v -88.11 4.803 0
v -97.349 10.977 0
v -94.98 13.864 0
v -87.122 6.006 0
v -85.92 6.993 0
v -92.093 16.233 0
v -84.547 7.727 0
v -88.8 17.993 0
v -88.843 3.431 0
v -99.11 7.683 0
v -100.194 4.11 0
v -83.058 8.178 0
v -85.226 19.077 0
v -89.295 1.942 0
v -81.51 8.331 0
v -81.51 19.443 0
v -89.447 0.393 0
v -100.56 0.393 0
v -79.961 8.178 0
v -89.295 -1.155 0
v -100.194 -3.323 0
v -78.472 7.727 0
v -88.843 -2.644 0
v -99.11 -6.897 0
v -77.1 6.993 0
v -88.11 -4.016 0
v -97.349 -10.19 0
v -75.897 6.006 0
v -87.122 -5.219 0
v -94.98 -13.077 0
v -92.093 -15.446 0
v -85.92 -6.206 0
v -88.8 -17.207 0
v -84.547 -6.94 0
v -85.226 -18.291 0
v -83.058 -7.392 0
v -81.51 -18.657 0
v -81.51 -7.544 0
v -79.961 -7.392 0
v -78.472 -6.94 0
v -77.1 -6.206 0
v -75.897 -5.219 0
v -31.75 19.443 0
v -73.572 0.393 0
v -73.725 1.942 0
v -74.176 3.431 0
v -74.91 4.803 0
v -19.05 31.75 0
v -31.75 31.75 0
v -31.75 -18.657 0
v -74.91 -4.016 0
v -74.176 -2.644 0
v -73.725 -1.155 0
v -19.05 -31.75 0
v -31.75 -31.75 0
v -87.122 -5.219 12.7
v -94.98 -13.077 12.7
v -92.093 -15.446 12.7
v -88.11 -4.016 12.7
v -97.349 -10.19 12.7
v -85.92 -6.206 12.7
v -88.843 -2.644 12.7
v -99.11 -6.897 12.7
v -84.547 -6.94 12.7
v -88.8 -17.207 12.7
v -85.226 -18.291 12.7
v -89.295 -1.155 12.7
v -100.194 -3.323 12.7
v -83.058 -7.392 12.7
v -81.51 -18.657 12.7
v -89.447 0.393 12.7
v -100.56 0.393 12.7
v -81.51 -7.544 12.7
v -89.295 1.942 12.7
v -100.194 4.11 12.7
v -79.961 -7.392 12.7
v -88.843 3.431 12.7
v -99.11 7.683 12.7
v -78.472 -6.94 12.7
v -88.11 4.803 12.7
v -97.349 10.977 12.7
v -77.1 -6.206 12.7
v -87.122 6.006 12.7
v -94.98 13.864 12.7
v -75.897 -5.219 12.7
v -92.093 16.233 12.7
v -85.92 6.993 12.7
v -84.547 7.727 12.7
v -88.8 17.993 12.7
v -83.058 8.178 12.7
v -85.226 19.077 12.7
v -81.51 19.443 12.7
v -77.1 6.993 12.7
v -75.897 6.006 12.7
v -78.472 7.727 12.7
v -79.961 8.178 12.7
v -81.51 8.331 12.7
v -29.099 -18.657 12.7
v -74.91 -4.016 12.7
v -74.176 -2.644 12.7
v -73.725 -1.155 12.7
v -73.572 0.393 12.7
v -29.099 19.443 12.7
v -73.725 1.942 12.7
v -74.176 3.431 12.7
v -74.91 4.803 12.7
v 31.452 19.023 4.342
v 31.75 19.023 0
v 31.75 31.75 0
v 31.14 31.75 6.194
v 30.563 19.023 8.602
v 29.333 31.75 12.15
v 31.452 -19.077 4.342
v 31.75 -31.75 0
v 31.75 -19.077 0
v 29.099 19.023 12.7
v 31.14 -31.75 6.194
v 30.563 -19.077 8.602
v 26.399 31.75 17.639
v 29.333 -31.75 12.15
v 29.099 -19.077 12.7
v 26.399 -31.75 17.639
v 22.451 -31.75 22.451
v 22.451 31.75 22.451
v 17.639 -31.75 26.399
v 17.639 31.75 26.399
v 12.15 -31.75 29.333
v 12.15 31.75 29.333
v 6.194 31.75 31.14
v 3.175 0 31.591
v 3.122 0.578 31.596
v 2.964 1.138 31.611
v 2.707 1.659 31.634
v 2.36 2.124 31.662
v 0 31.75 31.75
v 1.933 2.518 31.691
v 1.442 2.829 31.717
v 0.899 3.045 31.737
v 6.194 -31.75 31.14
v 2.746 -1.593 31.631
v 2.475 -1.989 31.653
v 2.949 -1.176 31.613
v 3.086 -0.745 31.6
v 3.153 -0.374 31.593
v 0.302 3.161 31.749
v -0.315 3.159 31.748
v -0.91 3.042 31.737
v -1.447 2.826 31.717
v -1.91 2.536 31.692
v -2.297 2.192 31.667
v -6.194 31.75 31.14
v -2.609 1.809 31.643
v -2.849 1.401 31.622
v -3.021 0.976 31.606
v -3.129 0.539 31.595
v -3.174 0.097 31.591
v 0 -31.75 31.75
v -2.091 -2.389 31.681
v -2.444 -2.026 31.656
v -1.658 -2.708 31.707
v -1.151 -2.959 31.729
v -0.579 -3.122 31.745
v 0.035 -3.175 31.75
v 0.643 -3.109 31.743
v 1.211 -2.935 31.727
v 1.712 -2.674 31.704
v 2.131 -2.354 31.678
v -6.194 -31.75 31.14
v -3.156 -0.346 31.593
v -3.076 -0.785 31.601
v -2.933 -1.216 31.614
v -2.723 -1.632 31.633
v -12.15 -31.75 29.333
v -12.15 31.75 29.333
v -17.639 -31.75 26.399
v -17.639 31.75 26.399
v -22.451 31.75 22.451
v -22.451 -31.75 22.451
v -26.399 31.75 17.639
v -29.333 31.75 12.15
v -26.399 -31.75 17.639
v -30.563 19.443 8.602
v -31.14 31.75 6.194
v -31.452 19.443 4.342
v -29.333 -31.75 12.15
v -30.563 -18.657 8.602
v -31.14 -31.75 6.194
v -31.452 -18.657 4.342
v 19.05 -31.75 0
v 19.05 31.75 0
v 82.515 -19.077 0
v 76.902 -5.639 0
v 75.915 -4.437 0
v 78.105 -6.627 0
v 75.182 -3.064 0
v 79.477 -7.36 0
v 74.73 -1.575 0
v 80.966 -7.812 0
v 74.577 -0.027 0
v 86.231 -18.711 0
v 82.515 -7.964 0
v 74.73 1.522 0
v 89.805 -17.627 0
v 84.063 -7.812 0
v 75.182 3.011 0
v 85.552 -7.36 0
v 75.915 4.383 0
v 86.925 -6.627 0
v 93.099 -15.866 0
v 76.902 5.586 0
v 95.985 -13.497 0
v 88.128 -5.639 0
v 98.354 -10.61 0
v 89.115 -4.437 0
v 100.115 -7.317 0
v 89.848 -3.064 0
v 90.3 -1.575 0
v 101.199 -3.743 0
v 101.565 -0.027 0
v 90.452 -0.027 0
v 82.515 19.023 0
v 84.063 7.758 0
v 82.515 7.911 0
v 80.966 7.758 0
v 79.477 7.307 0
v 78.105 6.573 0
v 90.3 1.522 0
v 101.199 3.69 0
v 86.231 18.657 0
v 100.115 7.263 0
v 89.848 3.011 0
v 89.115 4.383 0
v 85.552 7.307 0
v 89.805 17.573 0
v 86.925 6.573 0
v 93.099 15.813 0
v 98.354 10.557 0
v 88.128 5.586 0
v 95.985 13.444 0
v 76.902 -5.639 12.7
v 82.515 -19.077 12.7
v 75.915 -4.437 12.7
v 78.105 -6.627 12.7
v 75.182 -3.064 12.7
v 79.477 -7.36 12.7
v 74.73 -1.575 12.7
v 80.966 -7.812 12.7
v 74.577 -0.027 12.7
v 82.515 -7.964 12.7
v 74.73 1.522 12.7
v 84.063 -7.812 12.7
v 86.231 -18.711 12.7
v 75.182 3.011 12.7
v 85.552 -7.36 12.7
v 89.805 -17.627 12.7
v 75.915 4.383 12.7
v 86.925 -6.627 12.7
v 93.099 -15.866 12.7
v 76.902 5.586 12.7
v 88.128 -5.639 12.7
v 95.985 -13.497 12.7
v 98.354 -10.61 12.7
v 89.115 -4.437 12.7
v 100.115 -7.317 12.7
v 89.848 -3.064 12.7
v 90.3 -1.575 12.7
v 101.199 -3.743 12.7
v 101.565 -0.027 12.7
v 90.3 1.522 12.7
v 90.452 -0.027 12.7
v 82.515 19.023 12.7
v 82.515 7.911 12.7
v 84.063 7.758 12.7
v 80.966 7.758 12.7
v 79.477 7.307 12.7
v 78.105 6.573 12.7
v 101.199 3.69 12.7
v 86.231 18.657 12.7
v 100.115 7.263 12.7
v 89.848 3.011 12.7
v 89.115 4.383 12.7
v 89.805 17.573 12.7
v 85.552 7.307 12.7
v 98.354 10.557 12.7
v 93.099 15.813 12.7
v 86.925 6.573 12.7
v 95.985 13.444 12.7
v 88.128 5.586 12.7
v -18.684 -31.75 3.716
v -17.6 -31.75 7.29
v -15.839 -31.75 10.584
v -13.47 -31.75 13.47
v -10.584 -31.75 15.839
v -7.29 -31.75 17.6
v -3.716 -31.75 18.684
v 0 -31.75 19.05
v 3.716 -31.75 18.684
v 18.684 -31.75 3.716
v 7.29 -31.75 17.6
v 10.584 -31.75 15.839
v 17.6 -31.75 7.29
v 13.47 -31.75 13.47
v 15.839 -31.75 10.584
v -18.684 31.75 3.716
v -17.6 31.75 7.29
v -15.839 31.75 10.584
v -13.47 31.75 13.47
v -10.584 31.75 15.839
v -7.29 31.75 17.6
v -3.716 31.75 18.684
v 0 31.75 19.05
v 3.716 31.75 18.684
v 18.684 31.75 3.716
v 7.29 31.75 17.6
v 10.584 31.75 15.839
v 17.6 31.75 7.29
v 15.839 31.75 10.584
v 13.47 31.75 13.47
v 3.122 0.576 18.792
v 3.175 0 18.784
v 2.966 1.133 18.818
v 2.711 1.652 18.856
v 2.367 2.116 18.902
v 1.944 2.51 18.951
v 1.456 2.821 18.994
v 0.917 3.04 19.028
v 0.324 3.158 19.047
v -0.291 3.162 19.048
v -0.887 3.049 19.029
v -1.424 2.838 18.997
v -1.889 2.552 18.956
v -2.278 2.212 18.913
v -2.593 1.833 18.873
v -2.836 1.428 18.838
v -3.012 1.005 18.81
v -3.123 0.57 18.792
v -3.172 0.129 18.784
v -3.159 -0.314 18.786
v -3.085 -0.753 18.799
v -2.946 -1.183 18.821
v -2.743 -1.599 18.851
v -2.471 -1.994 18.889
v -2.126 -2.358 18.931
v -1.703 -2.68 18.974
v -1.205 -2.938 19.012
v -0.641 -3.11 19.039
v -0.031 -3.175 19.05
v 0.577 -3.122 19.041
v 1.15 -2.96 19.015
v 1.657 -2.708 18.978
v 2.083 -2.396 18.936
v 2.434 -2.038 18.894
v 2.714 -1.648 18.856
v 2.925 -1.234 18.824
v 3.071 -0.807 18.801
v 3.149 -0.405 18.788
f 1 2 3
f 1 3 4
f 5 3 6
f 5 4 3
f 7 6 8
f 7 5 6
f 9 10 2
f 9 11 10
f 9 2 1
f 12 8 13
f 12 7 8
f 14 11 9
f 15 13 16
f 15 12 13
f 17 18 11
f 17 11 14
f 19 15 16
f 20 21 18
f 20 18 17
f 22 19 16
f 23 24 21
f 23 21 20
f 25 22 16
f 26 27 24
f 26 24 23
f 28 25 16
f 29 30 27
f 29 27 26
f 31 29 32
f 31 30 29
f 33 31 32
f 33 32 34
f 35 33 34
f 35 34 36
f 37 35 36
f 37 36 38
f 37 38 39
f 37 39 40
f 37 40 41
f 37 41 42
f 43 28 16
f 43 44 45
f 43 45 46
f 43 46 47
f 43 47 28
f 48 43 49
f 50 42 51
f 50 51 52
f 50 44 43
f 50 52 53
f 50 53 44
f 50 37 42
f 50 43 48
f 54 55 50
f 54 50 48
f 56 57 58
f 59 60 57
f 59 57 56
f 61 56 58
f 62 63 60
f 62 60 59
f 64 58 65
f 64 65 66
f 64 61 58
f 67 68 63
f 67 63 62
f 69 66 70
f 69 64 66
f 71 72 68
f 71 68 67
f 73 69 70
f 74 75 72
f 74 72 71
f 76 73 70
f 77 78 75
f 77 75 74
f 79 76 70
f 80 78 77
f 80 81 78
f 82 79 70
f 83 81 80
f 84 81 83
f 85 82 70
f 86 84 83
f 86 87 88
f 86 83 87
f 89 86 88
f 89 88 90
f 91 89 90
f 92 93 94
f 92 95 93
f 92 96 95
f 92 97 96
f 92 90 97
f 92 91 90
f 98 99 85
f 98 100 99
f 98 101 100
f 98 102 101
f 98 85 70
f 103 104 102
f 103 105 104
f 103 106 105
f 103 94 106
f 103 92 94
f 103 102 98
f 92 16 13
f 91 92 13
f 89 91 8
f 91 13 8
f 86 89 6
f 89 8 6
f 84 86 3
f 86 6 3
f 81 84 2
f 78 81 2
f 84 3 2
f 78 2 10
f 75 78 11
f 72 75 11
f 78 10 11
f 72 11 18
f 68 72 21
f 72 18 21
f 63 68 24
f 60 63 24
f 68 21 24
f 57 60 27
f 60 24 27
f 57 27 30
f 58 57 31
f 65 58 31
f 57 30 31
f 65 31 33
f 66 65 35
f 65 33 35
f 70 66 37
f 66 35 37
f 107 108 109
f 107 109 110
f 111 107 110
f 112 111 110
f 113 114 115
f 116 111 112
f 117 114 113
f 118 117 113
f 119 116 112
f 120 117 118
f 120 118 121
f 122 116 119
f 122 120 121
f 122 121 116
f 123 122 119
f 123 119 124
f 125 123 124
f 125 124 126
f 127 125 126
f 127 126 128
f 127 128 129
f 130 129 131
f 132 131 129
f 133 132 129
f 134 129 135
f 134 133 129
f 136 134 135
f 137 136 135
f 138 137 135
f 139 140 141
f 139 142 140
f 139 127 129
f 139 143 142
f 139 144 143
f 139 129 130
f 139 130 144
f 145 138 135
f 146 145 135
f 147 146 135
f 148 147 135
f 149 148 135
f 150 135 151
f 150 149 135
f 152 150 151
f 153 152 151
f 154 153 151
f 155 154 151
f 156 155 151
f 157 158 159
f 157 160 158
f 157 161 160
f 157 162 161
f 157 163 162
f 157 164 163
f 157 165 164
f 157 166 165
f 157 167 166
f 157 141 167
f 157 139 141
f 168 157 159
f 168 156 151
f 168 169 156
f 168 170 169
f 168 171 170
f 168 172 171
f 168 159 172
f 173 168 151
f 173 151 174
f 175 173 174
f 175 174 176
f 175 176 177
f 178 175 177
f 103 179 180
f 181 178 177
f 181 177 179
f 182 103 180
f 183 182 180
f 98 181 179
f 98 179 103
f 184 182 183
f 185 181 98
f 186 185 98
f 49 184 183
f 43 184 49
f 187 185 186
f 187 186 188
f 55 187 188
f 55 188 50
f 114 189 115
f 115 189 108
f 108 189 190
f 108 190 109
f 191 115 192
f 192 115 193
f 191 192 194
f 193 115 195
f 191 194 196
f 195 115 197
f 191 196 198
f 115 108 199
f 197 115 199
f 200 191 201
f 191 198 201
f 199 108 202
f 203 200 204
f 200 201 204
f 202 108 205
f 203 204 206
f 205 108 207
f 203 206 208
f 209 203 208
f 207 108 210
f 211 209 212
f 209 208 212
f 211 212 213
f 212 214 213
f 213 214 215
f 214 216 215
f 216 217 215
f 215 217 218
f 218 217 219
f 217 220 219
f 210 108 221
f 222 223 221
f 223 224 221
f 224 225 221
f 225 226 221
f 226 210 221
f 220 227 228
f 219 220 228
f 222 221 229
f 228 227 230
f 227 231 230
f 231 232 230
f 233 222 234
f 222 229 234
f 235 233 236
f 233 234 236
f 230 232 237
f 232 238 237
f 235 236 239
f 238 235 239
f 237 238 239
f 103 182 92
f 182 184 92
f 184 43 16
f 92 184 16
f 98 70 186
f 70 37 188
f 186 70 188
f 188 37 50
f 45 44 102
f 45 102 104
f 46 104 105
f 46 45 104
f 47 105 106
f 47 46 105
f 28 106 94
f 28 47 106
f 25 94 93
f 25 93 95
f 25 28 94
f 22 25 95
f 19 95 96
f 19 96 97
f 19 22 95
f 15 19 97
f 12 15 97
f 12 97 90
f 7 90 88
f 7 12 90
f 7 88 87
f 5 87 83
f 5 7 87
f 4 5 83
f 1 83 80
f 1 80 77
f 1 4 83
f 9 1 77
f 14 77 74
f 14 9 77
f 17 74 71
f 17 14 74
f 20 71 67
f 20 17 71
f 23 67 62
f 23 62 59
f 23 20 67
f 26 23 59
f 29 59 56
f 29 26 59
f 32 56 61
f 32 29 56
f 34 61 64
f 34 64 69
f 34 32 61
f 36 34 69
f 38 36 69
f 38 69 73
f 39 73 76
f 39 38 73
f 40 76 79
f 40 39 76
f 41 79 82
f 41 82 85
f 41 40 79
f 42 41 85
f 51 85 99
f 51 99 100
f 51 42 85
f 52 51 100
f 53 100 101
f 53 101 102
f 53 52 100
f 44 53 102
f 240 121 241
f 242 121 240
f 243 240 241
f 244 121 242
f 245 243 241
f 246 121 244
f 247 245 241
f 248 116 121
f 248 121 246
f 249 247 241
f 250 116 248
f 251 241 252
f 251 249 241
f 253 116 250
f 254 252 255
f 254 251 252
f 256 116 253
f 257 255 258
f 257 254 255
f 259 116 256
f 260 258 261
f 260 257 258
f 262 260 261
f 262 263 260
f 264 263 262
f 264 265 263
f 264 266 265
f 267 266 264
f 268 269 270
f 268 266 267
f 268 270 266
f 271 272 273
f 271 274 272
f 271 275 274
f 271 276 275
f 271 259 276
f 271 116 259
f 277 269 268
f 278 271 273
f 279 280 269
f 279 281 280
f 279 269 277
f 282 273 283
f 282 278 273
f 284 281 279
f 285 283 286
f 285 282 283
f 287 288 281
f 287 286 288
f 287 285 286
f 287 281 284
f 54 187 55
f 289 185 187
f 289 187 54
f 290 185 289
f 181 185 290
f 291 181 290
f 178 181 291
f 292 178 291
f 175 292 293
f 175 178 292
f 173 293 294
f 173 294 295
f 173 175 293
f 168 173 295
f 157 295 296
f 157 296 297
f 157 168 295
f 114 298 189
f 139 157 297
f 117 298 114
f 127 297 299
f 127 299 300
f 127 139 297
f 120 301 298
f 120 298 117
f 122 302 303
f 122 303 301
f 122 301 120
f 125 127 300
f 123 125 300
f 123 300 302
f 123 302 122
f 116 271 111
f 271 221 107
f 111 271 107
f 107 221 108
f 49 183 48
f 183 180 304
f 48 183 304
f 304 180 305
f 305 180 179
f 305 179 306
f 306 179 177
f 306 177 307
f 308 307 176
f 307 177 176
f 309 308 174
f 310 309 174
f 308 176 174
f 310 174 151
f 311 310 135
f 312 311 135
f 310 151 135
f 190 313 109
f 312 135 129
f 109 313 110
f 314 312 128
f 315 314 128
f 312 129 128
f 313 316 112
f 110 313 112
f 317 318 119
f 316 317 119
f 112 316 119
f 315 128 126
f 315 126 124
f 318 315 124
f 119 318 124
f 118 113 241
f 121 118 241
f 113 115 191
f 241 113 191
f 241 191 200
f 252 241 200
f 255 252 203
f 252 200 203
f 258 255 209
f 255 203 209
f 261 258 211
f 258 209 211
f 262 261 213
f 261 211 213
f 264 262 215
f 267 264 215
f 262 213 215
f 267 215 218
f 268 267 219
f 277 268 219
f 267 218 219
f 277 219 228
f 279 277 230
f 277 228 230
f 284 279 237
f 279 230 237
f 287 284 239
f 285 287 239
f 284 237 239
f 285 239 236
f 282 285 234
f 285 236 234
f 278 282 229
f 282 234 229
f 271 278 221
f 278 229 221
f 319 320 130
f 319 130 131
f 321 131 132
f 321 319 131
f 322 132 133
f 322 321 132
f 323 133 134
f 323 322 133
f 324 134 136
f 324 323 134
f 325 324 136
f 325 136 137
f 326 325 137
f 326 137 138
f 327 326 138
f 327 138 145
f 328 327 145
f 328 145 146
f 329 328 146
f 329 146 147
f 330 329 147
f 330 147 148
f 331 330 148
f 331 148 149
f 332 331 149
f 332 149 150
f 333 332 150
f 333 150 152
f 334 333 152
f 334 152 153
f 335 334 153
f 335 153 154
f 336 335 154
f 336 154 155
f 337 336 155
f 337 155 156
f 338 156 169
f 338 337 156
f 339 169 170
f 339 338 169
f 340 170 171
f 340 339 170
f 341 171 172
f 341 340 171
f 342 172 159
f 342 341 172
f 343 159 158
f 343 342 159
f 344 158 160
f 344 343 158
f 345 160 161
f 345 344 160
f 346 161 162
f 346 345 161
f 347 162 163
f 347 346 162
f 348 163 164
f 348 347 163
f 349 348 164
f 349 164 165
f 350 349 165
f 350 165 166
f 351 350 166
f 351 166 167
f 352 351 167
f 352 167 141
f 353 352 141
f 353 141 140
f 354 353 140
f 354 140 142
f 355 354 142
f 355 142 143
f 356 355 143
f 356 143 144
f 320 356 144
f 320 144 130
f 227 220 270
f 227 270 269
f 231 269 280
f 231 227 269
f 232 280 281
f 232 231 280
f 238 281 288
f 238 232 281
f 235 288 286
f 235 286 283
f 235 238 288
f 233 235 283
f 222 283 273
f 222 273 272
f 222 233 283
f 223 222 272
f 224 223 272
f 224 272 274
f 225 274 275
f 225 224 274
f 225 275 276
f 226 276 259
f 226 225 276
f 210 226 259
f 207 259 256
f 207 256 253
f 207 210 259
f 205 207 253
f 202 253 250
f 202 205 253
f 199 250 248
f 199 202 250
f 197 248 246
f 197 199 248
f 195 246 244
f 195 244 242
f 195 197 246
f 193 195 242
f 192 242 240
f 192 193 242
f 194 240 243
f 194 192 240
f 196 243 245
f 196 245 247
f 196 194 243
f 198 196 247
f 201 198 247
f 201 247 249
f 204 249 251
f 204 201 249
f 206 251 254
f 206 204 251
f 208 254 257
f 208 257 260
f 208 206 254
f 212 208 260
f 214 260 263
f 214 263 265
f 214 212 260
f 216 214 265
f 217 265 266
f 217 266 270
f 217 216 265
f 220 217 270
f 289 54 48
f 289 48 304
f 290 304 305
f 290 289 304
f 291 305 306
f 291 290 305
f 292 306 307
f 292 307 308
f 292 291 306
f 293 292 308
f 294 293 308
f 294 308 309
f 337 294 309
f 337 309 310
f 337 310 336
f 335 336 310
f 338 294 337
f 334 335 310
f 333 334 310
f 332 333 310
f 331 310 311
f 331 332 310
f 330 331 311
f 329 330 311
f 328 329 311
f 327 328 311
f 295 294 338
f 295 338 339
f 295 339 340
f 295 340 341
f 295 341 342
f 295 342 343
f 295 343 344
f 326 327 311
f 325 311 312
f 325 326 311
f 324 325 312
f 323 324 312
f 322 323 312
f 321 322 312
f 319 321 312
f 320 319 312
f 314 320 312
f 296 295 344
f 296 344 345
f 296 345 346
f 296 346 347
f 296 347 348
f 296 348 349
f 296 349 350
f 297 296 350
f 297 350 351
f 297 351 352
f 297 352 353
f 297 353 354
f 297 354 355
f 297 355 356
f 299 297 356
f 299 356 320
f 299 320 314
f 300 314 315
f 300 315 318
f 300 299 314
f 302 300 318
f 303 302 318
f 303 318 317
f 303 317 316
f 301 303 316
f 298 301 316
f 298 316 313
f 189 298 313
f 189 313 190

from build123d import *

# Parameters (mm, degrees)
F1_DEPTH = 31.75
F2_R     = 3.175
F3_DEPTH = 41.402
F2_R_2   = 7.9375
F4_DEPTH = 12.7


with BuildPart() as f1:
    # F0 (on Front) → F1 (new body, symmetric)
    with BuildSketch(Plane.XZ):
        with BuildLine():
            Line((-31.75, 0), (-19.05, 0))
            ThreePointArc((-19.05, 0), (0, 19.05), (19.05, 0))
            Line((19.05, 0), (31.75, 0))
            ThreePointArc((31.75, 0), (0, 31.75), (-31.75, 0))
        make_face()
    extrude(amount=F1_DEPTH, both=True)

    # F2 (on Top) → F3 (cut)
    with BuildSketch(Plane.XY):
        Circle(F2_R)
    extrude(amount=F3_DEPTH, mode=Mode.SUBTRACT)

    # F2 (on Top) → F4 (join)
    with BuildSketch(Plane.XY):
        with BuildLine():
            ThreePointArc((82.514942, -19.076727), (101.564942, -0.026727), (82.514942, 19.023273))
            Line((82.514942, 19.023273), (19.05, 19.023273))
            Line((19.05, 19.023273), (19.05, -19.076727))
            Line((19.05, -19.076727), (82.514942, -19.076727))
        make_face()
        with Locations((82.514942, -0.026727)):
            Circle(F2_R_2, mode=Mode.SUBTRACT)
        with BuildLine():
            Line((-19.05, 19.443342), (-81.509791, 19.443342))
            ThreePointArc((-81.509791, 19.443342), (-100.559791, 0.393342), (-81.509791, -18.656658))
            Line((-81.509791, -18.656658), (-19.05, -18.656658))
            Line((-19.05, -18.656658), (-19.05, 19.443342))
        make_face()
        with Locations((-81.509791, 0.393342)):
            Circle(F2_R_2, mode=Mode.SUBTRACT)
    extrude(amount=F4_DEPTH)


solid = f1.part
